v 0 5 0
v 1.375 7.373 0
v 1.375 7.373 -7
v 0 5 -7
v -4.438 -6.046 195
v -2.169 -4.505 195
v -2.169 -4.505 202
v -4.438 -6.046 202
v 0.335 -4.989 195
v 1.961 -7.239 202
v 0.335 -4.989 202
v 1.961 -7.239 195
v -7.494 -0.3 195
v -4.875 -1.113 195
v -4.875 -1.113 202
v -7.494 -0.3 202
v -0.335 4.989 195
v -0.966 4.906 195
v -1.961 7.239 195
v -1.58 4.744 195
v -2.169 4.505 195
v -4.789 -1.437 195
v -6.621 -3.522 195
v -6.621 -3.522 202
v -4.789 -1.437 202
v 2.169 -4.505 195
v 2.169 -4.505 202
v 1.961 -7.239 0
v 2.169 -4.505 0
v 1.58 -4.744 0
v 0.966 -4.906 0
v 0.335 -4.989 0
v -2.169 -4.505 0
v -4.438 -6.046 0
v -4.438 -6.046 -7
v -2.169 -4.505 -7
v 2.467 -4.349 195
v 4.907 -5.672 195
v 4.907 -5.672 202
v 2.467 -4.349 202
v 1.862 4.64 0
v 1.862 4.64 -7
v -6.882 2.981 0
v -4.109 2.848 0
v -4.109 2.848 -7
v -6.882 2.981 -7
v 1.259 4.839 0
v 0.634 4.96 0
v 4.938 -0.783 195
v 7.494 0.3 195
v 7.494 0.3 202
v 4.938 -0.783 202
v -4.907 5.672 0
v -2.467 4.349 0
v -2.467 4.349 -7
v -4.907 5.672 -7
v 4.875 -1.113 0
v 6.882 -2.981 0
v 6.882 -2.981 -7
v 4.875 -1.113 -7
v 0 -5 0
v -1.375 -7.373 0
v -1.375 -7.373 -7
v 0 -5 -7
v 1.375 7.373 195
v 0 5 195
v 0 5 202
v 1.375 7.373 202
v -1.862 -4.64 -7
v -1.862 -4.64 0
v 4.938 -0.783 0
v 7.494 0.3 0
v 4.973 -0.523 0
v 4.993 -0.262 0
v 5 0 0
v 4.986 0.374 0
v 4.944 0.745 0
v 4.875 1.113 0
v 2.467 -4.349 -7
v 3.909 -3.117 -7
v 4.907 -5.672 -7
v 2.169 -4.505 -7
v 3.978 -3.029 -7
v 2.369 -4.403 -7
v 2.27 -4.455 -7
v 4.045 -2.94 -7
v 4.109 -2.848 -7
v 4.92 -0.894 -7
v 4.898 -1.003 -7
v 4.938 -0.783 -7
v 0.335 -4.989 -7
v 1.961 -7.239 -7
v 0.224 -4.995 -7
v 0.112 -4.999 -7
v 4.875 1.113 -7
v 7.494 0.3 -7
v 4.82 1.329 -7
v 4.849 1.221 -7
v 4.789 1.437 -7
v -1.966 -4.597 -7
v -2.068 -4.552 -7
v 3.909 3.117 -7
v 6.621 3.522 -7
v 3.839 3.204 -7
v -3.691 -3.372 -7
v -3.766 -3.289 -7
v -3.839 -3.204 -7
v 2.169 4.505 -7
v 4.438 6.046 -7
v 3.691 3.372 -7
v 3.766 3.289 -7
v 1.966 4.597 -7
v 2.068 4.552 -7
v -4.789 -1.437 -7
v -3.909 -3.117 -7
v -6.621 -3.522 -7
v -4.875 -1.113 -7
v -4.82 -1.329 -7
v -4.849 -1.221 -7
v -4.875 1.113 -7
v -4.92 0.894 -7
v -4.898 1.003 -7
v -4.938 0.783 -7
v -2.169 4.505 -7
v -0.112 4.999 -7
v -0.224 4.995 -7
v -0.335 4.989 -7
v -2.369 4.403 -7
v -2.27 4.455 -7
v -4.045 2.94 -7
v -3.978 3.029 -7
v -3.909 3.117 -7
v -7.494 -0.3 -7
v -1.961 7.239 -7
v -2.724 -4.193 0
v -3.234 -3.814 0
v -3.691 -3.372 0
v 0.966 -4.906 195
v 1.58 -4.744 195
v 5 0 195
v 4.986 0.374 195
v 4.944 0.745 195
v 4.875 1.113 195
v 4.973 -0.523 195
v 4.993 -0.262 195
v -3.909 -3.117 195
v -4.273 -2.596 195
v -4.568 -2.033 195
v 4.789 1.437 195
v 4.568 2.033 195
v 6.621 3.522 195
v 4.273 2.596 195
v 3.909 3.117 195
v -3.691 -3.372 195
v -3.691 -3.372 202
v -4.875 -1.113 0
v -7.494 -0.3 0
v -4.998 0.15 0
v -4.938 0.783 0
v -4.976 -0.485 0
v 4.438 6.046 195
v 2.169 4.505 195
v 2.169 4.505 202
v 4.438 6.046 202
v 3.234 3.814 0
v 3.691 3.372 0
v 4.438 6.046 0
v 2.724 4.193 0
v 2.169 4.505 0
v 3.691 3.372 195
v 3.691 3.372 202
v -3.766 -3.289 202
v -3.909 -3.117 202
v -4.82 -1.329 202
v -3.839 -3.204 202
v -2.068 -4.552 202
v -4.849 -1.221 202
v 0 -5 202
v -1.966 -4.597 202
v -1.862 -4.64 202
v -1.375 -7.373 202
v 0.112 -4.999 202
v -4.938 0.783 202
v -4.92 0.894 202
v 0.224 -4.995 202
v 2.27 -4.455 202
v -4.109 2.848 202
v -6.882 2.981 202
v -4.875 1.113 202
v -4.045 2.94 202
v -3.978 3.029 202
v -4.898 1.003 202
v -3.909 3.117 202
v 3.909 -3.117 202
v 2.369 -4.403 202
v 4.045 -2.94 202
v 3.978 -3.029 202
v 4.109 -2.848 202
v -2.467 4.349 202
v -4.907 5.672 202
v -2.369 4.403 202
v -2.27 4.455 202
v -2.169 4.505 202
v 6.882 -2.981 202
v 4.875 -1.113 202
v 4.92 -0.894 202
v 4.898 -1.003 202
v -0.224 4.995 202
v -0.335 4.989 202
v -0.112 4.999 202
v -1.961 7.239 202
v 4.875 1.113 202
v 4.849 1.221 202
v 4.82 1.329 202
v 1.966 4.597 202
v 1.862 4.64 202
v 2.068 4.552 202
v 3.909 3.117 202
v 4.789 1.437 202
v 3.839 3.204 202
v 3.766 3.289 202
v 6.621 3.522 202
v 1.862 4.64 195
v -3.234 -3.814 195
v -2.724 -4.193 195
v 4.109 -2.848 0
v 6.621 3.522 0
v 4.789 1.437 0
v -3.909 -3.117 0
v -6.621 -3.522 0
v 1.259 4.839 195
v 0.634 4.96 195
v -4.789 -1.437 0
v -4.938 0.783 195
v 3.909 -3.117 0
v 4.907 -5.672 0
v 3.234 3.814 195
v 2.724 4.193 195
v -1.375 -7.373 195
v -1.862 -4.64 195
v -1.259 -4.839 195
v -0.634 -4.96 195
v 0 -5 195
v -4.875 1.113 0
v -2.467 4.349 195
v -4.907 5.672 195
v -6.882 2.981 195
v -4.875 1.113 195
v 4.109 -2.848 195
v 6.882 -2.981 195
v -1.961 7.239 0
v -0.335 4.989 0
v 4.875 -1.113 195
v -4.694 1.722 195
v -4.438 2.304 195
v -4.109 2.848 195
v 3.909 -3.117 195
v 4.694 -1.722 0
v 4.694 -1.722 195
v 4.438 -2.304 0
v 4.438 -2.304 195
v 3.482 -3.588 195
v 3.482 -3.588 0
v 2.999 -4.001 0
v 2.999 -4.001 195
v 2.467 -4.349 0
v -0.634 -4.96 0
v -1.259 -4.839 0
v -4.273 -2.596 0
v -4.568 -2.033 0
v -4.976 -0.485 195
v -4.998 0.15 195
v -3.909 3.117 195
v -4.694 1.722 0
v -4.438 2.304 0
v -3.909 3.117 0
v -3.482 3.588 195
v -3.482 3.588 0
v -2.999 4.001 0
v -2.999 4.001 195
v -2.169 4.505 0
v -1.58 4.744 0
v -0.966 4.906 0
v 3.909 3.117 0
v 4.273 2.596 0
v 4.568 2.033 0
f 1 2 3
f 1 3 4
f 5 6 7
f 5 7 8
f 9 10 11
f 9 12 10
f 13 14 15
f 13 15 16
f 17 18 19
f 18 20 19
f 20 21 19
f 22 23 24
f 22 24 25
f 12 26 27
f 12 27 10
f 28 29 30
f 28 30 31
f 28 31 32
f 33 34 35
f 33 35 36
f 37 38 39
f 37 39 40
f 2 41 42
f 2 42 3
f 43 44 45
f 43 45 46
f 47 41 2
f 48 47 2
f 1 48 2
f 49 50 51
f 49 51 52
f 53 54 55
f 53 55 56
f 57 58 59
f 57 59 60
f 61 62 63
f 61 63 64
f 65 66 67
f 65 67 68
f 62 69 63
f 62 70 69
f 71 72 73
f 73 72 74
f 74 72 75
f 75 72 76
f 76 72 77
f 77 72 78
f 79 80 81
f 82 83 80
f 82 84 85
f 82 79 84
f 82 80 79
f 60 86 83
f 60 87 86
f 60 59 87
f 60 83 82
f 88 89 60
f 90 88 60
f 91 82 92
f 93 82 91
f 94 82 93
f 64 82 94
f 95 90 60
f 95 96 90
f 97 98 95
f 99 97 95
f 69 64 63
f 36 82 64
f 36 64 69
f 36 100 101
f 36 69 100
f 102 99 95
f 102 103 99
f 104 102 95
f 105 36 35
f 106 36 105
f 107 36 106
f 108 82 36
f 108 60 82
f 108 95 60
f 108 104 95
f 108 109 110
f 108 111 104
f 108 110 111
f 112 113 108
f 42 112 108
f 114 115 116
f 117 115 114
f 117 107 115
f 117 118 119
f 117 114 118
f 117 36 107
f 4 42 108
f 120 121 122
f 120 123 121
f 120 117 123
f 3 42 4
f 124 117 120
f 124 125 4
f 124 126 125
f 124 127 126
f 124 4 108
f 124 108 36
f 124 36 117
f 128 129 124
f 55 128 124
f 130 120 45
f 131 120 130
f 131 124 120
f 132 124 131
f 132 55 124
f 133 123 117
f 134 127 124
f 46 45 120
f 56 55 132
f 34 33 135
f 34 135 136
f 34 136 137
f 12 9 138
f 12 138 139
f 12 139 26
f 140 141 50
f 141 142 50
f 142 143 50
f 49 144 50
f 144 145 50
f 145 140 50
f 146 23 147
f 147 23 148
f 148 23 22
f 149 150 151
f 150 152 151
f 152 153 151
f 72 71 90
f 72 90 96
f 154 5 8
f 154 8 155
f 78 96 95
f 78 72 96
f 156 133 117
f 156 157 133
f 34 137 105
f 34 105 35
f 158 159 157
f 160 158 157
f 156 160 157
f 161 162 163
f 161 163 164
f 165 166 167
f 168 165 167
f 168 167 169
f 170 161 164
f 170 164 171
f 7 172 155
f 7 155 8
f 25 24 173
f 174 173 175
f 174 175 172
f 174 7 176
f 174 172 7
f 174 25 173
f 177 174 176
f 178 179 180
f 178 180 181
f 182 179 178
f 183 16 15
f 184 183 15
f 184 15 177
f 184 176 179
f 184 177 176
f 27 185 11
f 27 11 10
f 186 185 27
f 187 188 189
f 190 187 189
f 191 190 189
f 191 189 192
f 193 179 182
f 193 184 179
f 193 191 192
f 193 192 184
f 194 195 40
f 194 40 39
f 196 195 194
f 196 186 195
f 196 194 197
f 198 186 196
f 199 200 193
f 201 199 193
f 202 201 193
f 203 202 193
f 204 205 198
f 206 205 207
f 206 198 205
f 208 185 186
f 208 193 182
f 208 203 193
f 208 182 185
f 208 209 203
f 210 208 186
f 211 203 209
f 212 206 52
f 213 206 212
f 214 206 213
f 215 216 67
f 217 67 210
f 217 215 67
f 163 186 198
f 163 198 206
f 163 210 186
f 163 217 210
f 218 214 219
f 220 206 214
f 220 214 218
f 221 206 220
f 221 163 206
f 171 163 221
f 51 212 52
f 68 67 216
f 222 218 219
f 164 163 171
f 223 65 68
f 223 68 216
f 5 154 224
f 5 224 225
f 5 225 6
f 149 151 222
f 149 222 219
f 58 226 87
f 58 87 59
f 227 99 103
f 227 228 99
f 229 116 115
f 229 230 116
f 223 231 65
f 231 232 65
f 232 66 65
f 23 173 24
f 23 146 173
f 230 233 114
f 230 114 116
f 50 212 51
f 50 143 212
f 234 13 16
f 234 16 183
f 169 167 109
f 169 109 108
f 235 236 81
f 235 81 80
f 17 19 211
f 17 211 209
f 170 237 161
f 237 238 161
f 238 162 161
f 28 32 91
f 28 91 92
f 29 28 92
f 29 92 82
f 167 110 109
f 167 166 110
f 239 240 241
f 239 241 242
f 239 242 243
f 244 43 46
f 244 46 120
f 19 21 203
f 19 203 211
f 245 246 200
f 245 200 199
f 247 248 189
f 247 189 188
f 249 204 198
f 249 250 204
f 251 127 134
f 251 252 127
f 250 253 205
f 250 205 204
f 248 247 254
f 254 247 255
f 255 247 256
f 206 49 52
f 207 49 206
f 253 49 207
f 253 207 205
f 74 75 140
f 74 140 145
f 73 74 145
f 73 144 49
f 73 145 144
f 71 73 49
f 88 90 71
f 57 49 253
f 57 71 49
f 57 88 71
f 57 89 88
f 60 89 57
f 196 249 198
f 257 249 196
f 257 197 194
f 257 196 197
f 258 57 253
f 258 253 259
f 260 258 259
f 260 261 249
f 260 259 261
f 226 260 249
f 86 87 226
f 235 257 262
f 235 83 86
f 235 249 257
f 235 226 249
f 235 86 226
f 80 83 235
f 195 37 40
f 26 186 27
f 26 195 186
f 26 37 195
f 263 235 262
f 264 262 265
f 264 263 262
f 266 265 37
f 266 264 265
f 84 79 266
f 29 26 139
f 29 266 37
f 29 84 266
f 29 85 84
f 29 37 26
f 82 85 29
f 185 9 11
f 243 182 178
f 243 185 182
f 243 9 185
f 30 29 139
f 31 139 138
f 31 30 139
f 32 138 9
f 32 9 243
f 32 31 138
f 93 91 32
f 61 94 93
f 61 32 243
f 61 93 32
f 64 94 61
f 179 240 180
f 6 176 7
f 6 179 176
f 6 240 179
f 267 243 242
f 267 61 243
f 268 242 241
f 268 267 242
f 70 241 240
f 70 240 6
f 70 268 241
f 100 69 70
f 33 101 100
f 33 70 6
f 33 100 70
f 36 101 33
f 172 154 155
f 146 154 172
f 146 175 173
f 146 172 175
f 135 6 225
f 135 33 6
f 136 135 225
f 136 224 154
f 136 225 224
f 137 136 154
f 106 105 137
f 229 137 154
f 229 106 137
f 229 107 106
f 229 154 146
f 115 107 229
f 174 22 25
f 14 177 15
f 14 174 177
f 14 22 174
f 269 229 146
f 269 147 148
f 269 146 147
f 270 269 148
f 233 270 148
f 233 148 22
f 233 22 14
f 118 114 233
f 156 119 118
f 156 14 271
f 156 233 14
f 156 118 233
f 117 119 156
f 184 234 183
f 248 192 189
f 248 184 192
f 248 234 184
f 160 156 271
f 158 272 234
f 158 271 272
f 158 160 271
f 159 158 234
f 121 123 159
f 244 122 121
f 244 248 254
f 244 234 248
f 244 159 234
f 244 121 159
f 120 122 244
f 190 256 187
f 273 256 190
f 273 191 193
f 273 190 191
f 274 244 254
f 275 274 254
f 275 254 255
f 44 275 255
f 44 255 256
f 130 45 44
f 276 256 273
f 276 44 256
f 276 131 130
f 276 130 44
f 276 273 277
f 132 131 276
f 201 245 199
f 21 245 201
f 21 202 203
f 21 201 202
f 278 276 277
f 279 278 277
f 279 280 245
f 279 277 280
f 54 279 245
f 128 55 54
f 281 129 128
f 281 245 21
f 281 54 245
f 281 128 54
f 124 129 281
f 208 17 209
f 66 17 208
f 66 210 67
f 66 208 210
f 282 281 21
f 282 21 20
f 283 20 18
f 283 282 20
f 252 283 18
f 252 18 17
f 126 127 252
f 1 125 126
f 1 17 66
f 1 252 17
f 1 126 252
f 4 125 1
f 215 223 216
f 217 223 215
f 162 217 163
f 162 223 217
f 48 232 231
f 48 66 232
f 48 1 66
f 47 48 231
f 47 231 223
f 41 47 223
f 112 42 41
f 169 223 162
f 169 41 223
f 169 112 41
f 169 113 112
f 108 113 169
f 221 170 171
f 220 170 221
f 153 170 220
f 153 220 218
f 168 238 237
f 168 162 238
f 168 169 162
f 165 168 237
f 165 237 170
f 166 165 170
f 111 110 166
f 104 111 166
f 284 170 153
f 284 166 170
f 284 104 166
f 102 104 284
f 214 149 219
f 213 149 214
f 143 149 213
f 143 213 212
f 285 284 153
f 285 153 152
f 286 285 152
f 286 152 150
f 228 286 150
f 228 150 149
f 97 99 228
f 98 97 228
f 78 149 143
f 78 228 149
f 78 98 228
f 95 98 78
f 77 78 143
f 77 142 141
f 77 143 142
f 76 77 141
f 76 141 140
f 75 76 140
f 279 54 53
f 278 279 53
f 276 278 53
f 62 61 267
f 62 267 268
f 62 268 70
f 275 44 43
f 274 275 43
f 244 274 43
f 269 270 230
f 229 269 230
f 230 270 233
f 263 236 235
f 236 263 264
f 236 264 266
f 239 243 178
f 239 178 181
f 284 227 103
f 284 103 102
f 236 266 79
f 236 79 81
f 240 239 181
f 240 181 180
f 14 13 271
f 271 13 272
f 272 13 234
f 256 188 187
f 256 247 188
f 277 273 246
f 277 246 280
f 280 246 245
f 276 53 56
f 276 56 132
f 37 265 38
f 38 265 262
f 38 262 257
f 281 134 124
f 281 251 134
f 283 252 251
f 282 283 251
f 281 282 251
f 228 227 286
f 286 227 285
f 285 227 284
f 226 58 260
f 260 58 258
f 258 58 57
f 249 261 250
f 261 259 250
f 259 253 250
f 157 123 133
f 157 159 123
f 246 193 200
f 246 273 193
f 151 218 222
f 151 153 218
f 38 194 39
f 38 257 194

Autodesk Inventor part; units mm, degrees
ref_plane "YZ Plane" through (0, 0, 0) normal (1, 0, 0) x (0, 1, 0)
ref_plane "XZ Plane" through (0, 0, 0) normal (0, 1, 0) x (-1, 0, 0)
ref_plane "XY Plane" through (0, 0, 0) normal (0, 0, 1) x (1, 0, 0)
sketch "Skizze1" plane through (0, 0, 0) normal (0, 0, 1) x (1, 0, 0)
  circle A0 centre (0, 0) radius 5
  dimension "d0" = 10
extrude "Extrusion1" add sketch "Skizze1" along normal blind 195
sketch "Skizze2" plane through (0, 0, 195) normal (0, 0, 1) x (1, 0, 0)
  circle A0 centre (0, 0) radius 5 projected
  circle A1 centre (0, 0) radius 7.5
  circle A2 centre (0, 0) radius 5 projected
  line L0 (0, -5) -> (-1.3746, -7.373)
  line L1 (-1.3746, -7.373) -> (-1.8625, -4.6402)
  arc A3 (-1.8625, -4.6402) -> (0, -5) centre (0, 0) ccw
  line L2 (2.1694, -4.5048) -> (1.9606, -7.2392)
  line L3 (1.9606, -7.2392) -> (0.3352, -4.9888)
  arc A4 (0.3352, -4.9888) -> (2.1694, -4.5048) centre (0, 0) ccw
  line L4 (3.9092, -3.1174) -> (4.9074, -5.6716)
  line L5 (4.9074, -5.6716) -> (2.4666, -4.3493)
  arc A5 (2.4666, -4.3493) -> (3.9092, -3.1174) centre (0, 0) ccw
  line L6 (4.8746, -1.1126) -> (6.8822, -2.9807)
  line L7 (6.8822, -2.9807) -> (4.1094, -2.8484)
  arc A6 (4.1094, -2.8484) -> (4.8746, -1.1126) centre (0, 0) ccw
  line L8 (4.8746, 1.1126) -> (7.494, 0.3005)
  line L9 (7.494, 0.3005) -> (4.9383, -0.7833)
  arc A7 (4.9383, -0.7833) -> (4.8746, 1.1126) centre (0, 0) ccw
  line L10 (3.9092, 3.1174) -> (6.6214, 3.5223)
  line L11 (6.6214, 3.5223) -> (4.7891, 1.4369)
  arc A8 (4.7891, 1.4369) -> (3.9092, 3.1174) centre (0, 0) ccw
  line L12 (2.1694, 4.5048) -> (4.4375, 6.0464)
  line L13 (4.4375, 6.0464) -> (3.6914, 3.3725)
  arc A9 (3.6914, 3.3725) -> (2.1694, 4.5048) centre (0, 0) ccw
  line L14 (0, 5) -> (1.3746, 7.373)
  line L15 (1.3746, 7.373) -> (1.8625, 4.6402)
  arc A10 (1.8625, 4.6402) -> (0, 5) centre (0, 0) ccw
  line L16 (-2.1694, 4.5048) -> (-1.9606, 7.2392)
  line L17 (-1.9606, 7.2392) -> (-0.3352, 4.9888)
  arc A11 (-0.3352, 4.9888) -> (-2.1694, 4.5048) centre (0, 0) ccw
  line L18 (-3.9092, 3.1174) -> (-4.9074, 5.6716)
  line L19 (-4.9074, 5.6716) -> (-2.4666, 4.3493)
  arc A12 (-2.4666, 4.3493) -> (-3.9092, 3.1174) centre (0, 0) ccw
  line L20 (-4.8746, 1.1126) -> (-6.8822, 2.9807)
  line L21 (-6.8822, 2.9807) -> (-4.1094, 2.8484)
  arc A13 (-4.1094, 2.8484) -> (-4.8746, 1.1126) centre (0, 0) ccw
  line L22 (-4.8746, -1.1126) -> (-7.494, -0.3005)
  line L23 (-7.494, -0.3005) -> (-4.9383, 0.7833)
  arc A14 (-4.9383, 0.7833) -> (-4.8746, -1.1126) centre (0, 0) ccw
  line L24 (-3.9092, -3.1174) -> (-6.6214, -3.5223)
  line L25 (-6.6214, -3.5223) -> (-4.7891, -1.4369)
  arc A15 (-4.7891, -1.4369) -> (-3.9092, -3.1174) centre (0, 0) ccw
  line L26 (-2.1694, -4.5048) -> (-4.4375, -6.0464)
  line L27 (-4.4375, -6.0464) -> (-3.6914, -3.3725)
  arc A16 (-3.6914, -3.3725) -> (-2.1694, -4.5048) centre (0, 0) ccw
  dimension "d3" = 15
  dimension "d6" = 360
extrude "Extrusion2" add sketch "Skizze2" along normal blind 7 contours A0 | A0 L8 L9 | A0 L10 L11 | L6 L7 A0 | A0 L12 L13 | L4 L5 A0 | L15 A0 L14 | L3 A0 L2 | L17 A0 L16 | L1 A0 L0 | L19 A0 L18 | L27 A0 L26 | L21 A0 L20 | L25 A0 L24 | L23 A0 L22
ref_plane "Arbeitsebene1" through (0, 0, 97.5) normal (0, 0, -1) x (-1, 0, 0)
mirror "Spiegeln2" about plane through (0, 0, 97.5) normal (0, 0, -1) of "Extrusion2"
equation "\"d0\" = Durchmesser3"
equation "\"d3\" = Durchmesser1"
equation "\"Durchmesser1\" = 15"
equation "\"Größe1\" = 7"
equation "\"Durchmesser2\" = 3"
equation "\"Durchmesser3\" = 10"
equation "\"Größe3\" = 3"
equation "\"Größe4\" = 15"
properties part number "WelleRuder2"
